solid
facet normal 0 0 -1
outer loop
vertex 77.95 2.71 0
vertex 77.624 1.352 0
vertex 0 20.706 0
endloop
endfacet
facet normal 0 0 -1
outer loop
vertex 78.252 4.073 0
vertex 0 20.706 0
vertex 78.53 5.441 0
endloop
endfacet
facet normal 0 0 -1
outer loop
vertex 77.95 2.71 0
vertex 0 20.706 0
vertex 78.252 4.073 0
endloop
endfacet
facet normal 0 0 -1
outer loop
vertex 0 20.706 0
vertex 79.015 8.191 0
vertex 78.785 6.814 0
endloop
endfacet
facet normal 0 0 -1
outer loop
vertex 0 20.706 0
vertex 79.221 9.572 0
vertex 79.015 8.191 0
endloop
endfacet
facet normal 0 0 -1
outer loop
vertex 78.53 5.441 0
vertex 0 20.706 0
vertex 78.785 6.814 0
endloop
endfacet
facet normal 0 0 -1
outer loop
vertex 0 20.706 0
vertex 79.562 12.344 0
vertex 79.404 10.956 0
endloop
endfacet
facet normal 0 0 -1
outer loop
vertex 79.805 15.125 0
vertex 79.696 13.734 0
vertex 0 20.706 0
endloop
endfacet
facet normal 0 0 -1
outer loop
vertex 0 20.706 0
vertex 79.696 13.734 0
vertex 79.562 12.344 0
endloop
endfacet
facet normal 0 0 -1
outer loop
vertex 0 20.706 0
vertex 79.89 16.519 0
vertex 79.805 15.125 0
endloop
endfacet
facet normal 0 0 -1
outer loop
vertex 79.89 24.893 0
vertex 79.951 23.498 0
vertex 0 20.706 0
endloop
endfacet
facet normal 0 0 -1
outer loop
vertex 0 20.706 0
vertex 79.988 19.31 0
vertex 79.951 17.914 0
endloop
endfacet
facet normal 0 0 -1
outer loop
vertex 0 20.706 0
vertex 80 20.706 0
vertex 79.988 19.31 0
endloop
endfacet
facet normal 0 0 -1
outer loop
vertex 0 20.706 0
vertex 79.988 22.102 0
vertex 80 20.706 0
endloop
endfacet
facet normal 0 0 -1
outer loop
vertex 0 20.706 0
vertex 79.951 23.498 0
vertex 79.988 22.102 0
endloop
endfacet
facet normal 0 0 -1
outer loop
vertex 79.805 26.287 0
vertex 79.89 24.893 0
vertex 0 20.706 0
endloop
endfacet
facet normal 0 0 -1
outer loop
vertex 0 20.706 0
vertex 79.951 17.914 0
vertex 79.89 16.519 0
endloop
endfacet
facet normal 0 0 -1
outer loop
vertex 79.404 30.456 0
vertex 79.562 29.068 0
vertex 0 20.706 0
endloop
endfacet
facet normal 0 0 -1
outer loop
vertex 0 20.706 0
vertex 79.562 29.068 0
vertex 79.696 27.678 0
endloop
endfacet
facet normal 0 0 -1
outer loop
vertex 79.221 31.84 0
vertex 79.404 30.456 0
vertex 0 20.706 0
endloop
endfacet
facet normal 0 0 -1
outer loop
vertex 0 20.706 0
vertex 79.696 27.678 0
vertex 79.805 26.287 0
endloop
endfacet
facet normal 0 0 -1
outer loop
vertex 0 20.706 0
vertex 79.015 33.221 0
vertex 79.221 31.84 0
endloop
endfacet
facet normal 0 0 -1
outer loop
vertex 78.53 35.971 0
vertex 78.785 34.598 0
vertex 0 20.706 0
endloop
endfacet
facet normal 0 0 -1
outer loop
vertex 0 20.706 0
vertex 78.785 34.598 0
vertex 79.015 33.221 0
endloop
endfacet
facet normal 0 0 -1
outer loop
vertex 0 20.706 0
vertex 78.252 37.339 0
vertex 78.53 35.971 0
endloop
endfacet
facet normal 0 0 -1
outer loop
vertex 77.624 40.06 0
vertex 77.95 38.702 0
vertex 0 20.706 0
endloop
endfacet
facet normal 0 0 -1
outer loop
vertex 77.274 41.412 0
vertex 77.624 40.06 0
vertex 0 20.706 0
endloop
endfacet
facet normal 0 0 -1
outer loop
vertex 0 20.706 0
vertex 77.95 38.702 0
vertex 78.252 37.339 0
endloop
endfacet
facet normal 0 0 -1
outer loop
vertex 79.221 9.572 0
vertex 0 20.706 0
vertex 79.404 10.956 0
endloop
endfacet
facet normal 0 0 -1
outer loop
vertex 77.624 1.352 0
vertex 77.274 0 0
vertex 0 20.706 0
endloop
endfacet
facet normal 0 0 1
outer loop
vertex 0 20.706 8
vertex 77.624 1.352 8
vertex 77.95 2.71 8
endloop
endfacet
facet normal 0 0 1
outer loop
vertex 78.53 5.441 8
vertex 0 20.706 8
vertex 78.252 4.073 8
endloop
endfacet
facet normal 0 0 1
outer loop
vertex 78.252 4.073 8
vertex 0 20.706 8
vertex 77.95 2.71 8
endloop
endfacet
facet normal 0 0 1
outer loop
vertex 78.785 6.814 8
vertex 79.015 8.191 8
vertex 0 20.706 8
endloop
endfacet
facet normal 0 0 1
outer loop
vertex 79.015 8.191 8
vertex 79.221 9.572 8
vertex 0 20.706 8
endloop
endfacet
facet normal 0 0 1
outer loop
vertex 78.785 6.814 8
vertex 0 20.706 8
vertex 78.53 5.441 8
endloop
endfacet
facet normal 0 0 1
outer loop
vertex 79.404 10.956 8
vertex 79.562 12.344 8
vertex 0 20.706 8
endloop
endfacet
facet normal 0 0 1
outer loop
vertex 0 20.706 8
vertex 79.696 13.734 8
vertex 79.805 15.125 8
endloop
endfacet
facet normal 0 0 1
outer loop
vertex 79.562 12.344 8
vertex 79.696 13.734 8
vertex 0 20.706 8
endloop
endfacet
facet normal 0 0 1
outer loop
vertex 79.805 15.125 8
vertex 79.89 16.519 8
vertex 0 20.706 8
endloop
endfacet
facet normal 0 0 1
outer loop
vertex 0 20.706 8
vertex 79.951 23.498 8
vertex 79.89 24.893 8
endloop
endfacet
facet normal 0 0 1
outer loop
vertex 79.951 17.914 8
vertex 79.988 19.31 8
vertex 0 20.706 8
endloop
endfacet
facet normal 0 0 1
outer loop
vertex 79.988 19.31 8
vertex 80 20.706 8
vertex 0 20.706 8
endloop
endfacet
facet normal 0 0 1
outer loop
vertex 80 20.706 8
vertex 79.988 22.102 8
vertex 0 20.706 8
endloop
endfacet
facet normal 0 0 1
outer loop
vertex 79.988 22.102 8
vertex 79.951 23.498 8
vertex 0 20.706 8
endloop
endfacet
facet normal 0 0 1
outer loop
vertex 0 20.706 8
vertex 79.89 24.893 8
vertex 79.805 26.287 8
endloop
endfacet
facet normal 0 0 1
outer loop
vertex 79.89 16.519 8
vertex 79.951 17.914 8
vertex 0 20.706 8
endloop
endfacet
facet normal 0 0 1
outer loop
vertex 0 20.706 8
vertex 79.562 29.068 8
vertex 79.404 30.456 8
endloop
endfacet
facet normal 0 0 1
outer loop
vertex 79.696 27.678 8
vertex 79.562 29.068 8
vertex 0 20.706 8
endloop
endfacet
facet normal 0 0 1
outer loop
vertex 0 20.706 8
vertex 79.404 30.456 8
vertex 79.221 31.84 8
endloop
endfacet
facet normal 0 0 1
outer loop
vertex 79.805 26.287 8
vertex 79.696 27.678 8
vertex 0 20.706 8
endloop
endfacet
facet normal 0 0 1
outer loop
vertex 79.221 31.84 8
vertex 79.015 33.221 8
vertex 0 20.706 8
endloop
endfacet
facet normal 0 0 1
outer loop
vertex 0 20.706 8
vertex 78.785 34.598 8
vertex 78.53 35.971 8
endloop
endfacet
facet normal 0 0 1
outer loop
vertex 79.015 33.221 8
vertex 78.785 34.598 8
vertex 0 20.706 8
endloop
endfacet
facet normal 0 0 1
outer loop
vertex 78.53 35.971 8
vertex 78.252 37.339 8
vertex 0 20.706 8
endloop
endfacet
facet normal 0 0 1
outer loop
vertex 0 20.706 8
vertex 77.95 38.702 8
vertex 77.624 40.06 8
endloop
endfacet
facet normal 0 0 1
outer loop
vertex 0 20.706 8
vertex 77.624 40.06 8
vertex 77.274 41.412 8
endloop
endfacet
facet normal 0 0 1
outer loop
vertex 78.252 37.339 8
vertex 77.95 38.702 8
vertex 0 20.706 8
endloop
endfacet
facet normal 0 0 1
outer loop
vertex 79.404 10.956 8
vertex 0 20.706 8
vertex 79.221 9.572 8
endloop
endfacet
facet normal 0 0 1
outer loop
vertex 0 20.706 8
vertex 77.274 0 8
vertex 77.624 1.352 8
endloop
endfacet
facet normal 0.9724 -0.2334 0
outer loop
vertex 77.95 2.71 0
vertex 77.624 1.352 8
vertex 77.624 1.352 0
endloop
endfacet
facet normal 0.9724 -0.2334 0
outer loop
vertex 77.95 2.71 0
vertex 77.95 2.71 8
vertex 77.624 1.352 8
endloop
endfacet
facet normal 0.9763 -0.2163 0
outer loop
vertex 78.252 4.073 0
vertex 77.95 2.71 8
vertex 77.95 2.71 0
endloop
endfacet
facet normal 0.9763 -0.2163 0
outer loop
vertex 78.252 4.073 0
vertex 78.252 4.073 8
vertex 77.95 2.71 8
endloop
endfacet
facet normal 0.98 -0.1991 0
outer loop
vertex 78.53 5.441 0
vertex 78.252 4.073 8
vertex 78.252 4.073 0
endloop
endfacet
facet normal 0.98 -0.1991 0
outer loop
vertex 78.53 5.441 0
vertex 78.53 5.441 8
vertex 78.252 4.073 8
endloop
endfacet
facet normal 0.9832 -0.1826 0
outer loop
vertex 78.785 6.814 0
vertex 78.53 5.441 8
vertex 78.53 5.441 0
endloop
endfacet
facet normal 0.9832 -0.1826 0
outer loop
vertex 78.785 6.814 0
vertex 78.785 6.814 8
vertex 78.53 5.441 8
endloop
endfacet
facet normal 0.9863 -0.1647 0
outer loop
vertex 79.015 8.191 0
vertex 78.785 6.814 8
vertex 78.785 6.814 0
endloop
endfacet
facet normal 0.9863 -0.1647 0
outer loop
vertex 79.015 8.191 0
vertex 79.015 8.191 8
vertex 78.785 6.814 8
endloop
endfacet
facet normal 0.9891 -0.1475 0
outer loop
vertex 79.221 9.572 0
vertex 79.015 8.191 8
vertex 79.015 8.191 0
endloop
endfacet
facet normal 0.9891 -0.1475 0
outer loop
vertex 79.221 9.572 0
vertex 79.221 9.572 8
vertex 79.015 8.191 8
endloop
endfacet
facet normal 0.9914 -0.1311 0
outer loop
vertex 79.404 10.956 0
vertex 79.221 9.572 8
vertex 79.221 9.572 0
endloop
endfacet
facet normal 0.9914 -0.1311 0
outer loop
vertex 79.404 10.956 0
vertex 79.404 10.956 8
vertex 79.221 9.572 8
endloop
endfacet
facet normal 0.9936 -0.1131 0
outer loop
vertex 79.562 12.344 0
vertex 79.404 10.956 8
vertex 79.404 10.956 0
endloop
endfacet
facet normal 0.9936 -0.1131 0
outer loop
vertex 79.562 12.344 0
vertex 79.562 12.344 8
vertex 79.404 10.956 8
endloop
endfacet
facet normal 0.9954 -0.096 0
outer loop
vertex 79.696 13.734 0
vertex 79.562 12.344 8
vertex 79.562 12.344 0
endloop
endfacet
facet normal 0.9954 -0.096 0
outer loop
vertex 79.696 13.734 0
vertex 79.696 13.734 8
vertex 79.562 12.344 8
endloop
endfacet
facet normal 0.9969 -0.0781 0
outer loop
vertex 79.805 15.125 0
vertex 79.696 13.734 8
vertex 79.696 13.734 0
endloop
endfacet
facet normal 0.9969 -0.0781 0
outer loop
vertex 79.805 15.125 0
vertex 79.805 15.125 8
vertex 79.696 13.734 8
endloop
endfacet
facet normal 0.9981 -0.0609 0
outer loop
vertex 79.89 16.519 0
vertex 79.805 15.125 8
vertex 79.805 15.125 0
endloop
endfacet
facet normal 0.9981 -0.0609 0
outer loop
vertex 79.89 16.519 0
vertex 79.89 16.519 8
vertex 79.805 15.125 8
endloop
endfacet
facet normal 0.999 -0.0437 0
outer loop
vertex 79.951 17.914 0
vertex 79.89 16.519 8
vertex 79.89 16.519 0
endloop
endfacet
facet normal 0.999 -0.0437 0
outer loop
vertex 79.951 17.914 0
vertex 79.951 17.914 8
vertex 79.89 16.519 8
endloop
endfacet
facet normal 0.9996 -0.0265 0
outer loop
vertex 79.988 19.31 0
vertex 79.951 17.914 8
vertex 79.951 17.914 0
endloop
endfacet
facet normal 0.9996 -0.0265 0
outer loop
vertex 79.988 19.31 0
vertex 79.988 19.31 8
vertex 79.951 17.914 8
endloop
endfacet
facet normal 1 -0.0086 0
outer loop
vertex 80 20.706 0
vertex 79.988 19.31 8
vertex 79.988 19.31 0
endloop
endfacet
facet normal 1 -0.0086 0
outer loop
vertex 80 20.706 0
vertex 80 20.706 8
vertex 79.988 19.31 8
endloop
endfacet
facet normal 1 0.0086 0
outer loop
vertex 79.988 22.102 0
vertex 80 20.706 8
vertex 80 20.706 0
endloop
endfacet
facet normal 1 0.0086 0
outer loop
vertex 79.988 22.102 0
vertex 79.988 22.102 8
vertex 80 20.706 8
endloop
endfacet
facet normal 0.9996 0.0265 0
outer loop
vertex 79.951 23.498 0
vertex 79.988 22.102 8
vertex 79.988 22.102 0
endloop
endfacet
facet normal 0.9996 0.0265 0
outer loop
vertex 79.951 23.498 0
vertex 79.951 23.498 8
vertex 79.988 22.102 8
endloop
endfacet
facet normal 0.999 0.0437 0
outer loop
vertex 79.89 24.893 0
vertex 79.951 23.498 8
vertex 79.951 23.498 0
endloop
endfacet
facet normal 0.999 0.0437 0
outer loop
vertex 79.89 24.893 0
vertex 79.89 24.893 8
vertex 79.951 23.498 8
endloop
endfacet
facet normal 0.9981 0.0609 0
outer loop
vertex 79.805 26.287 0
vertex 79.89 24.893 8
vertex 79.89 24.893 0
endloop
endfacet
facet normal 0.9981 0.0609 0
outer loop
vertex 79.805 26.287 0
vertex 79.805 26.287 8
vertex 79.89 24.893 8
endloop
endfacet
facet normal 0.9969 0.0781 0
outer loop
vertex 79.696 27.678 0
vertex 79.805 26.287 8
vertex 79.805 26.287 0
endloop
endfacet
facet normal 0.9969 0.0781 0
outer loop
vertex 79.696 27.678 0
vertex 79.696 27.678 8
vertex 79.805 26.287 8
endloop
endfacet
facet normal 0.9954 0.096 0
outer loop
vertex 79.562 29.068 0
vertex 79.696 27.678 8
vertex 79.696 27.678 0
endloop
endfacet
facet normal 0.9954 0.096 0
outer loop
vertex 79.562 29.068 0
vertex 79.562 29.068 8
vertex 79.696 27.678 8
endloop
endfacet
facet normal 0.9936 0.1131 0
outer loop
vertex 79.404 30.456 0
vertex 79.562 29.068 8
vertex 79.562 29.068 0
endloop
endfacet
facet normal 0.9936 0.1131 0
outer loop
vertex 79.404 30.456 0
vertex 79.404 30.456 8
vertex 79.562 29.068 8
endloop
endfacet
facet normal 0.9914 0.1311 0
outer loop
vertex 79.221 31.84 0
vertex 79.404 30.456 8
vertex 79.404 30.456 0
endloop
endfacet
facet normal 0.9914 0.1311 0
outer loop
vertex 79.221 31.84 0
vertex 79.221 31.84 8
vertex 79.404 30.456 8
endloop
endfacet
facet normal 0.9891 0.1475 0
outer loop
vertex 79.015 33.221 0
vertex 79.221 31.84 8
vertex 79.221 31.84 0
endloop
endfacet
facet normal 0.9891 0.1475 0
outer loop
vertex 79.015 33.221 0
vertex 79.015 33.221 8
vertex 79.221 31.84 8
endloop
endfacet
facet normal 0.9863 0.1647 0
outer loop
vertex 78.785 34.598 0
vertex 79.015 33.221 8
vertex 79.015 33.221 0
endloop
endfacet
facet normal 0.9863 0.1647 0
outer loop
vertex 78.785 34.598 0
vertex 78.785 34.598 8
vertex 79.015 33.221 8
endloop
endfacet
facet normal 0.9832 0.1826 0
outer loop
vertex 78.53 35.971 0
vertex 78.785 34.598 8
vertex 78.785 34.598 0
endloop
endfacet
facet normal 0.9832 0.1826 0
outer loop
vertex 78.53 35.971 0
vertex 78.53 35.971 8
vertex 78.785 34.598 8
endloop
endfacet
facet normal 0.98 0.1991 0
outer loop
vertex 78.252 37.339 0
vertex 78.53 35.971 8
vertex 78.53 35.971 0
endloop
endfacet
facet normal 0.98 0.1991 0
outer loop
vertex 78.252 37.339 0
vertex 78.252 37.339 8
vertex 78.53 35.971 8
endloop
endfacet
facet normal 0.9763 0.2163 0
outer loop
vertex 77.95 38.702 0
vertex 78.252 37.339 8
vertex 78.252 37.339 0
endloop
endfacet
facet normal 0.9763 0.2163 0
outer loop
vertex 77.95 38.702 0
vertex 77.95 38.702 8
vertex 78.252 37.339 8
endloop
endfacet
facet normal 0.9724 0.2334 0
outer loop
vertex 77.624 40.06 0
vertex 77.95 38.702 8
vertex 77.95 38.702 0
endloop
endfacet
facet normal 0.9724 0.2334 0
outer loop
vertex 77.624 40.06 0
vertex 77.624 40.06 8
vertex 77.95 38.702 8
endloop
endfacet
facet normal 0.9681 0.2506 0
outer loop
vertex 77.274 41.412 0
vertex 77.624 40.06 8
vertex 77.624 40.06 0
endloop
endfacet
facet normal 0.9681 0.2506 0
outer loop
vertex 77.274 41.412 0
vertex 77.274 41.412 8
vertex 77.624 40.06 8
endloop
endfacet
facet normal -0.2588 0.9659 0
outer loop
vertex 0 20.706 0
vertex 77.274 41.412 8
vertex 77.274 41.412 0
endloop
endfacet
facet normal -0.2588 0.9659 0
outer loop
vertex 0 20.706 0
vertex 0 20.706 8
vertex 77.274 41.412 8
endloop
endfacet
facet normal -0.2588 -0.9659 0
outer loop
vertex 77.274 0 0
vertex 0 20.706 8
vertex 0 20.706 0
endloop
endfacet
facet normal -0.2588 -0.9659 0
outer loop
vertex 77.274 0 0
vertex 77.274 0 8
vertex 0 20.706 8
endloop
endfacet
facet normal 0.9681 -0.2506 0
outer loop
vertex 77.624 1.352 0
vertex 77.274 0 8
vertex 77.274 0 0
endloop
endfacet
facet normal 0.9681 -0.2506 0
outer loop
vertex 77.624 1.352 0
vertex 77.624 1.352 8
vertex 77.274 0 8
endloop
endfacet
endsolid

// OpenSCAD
$fn = 32;

// ----------------------------------------------------------------------
// Arc profile plate: sector, 32 points
// ----------------------------------------------------------------------

// --- parameters (mm) ---
sector_angle = 30;        // sector angle, degrees
sector_r = 80;            // outer radius
arc_step = 1;             // sampling step of the arc, degrees
plate_t = 8;              // plate thickness, Z
fit_tol = 0.02;           // declared fit tolerance (prompt contract)
free_tol = 0.2;           // declared free tolerance (prompt contract)

bbox_x = 2 * sector_r * sin(sector_angle / 2);  // chord of the sector
bbox_y = sector_r;  // depth of the sector (apex to arc)

profile = [[77.274, 0], [77.624, 1.352], [77.95, 2.71], [78.252, 4.073], [78.53, 5.441], [78.785, 6.814], [79.015, 8.191], [79.221, 9.572], [79.404, 10.956], [79.562, 12.344], [79.696, 13.734], [79.805, 15.125], [79.89, 16.519], [79.951, 17.914], [79.988, 19.31], [80, 20.706], [79.988, 22.102], [79.951, 23.498], [79.89, 24.893], [79.805, 26.287], [79.696, 27.678], [79.562, 29.068], [79.404, 30.456], [79.221, 31.84], [79.015, 33.221], [78.785, 34.598], [78.53, 35.971], [78.252, 37.339], [77.95, 38.702], [77.624, 40.06], [77.274, 41.412], [0, 20.706]];  // primary outline, 32 points, counter clockwise

// --- the one profile operation ---
linear_extrude(height = plate_t) polygon(points = profile);
